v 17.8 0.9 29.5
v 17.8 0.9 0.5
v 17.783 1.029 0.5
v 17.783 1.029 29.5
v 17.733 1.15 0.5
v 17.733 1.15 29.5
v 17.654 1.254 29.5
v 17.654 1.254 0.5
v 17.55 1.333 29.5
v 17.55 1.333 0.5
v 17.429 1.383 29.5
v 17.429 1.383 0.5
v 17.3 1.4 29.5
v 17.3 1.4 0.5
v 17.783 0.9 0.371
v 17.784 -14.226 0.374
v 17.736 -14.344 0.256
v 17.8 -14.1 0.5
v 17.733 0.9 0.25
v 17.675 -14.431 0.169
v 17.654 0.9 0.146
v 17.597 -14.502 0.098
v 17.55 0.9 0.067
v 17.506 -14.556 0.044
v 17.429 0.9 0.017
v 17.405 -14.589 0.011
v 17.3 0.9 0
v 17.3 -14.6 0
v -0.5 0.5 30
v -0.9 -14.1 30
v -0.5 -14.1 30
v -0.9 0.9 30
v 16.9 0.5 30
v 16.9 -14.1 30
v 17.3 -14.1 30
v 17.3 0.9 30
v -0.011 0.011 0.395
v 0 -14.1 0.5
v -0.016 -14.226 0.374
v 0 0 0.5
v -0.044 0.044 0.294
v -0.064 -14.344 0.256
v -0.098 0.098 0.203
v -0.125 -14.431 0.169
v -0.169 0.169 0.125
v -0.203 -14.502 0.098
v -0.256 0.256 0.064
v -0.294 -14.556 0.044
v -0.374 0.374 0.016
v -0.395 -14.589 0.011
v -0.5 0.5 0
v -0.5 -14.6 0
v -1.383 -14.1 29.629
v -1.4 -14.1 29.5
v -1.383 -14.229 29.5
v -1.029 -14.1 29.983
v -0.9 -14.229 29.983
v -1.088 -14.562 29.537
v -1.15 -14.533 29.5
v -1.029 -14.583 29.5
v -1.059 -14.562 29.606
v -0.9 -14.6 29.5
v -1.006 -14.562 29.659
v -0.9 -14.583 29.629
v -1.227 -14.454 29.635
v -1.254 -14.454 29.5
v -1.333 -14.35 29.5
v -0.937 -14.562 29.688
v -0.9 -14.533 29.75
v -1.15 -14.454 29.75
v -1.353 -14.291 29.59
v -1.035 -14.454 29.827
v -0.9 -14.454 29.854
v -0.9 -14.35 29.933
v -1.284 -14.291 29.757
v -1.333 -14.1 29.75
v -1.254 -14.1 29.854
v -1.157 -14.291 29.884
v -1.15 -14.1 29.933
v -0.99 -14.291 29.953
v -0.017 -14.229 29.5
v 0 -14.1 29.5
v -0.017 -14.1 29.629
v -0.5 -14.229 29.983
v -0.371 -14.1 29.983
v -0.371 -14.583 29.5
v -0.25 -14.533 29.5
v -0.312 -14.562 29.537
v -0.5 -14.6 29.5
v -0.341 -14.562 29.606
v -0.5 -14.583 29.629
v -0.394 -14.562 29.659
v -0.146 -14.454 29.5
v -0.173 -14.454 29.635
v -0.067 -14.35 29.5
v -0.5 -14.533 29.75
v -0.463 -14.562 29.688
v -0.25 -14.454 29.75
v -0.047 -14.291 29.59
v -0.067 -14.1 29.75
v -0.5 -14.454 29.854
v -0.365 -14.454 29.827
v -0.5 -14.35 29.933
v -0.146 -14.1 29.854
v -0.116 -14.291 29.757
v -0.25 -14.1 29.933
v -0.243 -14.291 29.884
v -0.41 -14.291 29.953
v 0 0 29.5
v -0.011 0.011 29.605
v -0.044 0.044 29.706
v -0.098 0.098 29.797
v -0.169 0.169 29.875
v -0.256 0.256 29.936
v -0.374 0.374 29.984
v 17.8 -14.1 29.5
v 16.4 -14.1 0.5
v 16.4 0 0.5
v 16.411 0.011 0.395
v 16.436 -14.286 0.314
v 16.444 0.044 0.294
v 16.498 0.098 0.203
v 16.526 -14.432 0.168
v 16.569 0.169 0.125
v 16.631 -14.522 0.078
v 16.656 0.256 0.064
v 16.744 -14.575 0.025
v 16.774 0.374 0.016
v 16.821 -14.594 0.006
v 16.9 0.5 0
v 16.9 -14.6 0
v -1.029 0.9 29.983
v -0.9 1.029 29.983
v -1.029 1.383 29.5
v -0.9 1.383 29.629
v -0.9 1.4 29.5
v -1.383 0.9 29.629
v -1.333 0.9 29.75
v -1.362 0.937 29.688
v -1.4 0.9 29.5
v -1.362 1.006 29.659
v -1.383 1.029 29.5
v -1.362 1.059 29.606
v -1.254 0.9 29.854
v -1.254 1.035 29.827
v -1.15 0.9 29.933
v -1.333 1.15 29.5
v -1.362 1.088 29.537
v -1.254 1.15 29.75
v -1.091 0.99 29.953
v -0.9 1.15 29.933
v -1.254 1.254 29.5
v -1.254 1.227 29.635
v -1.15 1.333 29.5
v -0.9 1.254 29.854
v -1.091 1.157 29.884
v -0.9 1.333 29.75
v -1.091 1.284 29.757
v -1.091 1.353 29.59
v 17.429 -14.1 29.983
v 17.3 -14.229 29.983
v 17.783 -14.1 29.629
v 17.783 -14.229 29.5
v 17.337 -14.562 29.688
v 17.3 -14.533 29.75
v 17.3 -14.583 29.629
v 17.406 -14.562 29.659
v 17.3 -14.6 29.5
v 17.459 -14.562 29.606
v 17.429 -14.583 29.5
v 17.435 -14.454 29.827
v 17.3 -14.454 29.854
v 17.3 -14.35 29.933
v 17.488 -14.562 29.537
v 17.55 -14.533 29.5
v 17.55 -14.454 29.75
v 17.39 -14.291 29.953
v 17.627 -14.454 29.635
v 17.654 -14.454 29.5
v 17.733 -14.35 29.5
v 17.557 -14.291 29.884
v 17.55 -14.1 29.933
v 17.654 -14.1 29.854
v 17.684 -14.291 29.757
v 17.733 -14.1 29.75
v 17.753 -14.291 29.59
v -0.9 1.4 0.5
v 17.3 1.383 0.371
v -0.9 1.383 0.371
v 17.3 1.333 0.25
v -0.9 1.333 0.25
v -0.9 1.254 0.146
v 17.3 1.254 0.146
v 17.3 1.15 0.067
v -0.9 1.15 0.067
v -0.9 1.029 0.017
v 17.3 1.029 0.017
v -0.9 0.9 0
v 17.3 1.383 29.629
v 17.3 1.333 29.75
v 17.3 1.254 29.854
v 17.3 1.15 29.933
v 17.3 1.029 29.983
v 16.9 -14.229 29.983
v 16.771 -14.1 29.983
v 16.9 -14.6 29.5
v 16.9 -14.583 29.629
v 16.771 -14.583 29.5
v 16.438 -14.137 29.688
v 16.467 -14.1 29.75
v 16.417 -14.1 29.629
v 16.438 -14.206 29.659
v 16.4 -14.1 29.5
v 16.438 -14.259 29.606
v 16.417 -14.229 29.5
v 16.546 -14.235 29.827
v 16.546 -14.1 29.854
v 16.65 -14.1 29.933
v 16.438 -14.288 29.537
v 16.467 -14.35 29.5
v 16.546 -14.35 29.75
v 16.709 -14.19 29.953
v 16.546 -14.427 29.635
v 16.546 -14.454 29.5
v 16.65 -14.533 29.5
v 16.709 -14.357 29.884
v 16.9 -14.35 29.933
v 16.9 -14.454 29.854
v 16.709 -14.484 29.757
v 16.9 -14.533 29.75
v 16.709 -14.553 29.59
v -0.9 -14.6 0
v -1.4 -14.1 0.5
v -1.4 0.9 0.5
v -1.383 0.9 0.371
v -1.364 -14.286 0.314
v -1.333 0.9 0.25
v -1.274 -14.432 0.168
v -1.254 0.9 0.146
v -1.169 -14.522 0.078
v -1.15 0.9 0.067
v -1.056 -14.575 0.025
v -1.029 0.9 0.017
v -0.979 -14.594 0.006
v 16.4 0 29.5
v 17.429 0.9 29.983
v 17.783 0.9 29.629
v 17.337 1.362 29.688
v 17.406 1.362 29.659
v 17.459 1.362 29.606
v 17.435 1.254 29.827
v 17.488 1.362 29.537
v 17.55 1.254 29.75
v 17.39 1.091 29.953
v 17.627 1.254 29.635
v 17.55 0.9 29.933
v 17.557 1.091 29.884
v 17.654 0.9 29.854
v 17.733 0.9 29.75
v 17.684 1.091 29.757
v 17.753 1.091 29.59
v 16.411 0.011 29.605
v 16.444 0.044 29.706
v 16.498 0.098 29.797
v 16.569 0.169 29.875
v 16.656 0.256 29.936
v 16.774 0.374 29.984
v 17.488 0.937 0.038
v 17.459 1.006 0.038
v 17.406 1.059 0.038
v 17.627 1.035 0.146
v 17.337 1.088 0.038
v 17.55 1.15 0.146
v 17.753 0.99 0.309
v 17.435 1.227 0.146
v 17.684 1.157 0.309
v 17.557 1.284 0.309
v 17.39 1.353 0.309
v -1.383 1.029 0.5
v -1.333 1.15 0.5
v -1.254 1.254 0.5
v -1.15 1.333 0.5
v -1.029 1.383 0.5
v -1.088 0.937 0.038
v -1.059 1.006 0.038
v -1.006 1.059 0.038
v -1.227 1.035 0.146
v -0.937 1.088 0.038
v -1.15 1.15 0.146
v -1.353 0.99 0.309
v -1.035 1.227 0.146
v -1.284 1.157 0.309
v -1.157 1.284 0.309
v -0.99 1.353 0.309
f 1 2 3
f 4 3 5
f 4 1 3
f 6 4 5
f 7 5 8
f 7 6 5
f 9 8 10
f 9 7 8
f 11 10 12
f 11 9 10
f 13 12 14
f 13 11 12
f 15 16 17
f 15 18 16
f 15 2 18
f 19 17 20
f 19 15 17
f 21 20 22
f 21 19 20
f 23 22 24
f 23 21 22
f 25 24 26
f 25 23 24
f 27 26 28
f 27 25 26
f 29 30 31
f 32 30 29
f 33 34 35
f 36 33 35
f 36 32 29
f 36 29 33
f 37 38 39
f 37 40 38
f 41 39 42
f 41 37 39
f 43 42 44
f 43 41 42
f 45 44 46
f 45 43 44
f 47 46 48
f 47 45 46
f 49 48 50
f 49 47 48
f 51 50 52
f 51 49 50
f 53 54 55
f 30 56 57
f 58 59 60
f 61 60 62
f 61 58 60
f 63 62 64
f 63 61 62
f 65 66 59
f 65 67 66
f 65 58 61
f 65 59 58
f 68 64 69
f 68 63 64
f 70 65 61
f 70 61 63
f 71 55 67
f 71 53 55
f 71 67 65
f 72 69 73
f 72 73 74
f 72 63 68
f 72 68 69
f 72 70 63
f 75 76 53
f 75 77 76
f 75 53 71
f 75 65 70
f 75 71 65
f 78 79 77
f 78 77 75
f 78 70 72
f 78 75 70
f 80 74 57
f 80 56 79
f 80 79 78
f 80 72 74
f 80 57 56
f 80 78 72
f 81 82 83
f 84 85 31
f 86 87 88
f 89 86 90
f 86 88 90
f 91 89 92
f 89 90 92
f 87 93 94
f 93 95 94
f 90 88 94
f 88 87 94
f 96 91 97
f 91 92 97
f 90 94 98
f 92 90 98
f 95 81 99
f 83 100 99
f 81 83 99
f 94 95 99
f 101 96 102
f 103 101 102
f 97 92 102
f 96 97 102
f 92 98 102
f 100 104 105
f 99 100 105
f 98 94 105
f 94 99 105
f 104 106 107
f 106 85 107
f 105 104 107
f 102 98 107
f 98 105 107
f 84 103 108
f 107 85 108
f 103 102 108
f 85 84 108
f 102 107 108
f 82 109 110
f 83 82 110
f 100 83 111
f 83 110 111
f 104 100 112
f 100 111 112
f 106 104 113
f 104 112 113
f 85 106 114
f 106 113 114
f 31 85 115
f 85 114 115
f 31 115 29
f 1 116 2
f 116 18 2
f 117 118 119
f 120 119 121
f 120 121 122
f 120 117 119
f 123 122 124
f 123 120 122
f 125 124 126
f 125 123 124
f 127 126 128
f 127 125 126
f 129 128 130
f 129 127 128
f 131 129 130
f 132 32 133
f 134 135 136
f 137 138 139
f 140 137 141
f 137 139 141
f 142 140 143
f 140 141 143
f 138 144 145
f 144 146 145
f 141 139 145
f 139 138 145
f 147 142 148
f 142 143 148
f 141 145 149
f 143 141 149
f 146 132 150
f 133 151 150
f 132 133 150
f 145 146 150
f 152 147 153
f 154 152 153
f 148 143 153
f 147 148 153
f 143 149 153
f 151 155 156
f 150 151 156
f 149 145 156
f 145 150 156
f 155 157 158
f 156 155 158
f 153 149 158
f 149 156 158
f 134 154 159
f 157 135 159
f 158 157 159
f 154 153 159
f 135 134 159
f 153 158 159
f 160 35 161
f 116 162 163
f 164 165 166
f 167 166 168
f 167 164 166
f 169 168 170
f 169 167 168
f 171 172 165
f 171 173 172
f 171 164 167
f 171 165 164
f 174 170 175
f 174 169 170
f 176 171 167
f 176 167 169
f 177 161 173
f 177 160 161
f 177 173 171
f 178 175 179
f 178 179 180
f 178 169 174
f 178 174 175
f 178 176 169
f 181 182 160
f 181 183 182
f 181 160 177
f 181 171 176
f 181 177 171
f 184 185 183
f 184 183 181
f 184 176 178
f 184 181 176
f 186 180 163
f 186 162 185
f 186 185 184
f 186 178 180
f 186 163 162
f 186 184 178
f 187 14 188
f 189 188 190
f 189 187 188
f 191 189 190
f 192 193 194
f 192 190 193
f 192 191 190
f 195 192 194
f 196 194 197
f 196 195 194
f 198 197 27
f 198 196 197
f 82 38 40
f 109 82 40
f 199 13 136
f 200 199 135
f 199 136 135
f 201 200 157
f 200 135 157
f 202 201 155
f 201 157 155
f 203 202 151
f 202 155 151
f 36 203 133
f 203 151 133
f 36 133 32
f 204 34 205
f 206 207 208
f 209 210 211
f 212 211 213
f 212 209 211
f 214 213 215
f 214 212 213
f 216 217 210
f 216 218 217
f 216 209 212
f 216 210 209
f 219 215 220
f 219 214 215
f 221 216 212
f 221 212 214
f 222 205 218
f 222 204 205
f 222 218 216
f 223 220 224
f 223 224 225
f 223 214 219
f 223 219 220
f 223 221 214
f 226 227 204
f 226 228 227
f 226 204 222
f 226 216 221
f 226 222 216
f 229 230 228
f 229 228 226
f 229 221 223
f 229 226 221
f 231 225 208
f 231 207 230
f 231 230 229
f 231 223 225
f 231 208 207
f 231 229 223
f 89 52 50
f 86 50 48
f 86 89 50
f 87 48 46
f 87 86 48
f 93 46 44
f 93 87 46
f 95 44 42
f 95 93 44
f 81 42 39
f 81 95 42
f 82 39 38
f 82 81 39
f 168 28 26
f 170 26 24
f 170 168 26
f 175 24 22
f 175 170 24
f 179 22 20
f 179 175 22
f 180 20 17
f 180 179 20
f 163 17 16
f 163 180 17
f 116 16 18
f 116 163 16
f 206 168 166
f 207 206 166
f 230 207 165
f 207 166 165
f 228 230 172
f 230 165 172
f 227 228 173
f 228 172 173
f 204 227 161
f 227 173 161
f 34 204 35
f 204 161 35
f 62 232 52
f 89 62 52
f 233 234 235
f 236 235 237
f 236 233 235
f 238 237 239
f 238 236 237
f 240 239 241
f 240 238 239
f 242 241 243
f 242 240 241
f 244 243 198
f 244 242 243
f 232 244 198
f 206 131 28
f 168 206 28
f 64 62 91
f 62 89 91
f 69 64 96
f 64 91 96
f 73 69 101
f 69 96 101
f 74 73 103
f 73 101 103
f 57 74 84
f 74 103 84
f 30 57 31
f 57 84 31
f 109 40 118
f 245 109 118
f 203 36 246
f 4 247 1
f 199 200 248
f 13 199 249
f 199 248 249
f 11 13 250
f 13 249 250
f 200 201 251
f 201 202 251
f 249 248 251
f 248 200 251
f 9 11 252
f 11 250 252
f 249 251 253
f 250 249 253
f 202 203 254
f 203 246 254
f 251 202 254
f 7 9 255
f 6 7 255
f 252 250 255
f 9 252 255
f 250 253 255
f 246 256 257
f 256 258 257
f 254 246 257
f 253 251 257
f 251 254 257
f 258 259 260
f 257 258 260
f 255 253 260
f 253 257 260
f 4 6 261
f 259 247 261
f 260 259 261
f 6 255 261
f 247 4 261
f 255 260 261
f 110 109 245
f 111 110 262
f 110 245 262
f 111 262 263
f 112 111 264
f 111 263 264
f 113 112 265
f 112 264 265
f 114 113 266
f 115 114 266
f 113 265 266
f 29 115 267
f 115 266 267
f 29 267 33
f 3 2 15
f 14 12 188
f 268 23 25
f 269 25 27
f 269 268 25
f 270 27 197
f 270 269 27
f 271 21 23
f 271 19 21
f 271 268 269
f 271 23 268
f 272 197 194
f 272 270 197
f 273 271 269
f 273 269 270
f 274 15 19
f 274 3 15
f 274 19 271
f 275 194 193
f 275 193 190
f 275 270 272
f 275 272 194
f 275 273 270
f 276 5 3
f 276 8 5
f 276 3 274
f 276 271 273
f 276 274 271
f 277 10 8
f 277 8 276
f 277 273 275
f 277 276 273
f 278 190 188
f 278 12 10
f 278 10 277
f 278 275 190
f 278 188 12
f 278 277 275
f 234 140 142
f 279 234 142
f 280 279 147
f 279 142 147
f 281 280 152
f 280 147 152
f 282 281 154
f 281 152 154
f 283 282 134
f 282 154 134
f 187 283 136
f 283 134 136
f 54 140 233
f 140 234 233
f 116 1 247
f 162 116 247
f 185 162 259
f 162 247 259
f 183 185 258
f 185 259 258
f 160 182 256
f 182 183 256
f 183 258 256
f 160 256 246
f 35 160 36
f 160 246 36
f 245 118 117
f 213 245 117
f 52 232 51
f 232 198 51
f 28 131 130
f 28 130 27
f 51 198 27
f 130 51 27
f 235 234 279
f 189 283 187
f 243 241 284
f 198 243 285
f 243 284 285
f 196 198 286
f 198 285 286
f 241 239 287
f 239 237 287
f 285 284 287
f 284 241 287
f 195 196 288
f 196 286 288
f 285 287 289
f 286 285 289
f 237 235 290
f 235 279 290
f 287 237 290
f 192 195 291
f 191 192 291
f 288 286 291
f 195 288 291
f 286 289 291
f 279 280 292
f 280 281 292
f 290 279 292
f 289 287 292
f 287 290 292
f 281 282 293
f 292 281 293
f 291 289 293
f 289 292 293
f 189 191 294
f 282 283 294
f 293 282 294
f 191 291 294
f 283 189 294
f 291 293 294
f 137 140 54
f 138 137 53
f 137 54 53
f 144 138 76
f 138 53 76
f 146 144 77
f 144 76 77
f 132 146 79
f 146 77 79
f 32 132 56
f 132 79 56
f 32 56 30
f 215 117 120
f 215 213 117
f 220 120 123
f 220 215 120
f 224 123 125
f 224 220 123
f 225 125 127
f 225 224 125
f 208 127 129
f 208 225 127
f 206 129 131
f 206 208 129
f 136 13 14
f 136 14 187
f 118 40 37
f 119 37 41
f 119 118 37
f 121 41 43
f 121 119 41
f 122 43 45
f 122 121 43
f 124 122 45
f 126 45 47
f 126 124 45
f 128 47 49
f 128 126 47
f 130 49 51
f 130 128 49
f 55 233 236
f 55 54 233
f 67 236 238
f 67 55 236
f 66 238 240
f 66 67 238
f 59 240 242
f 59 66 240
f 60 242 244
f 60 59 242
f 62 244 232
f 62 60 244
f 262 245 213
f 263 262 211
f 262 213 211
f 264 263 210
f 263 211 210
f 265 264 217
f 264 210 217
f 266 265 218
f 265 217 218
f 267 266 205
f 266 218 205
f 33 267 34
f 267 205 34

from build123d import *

# Parameters (mm, degrees)
PAD_DEPTH = 30
FILLET_R  = 0.5


with BuildPart() as part:
    # Sketch → Pad (new body)
    with BuildSketch(Plane.XY):
        Polygon((-1.4, 1.4), (-1.4, -14.6), (0, -14.6), (0, 0), (16.4, 0), (16.4, -14.6), (17.8, -14.6), (17.8, 1.4), align=None)
    extrude(amount=PAD_DEPTH)

    # Fillet
    fillet_edges = [part.edges().sort_by_distance(p)[0] for p in [
        (17.8, -6.6, 30),
        (17.1, -14.6, 30),
        (16.4, -7.3, 30),
        (8.2, 0, 30),
        (8.2, 1.4, 30),
        (-1.4, -6.6, 30),
        (0, -7.3, 30),
        (-1.4, 1.4, 15),
        (17.8, 1.4, 15),
        (17.8, -14.6, 15),
        (16.4, -14.6, 15),
        (0, -14.6, 15),
        (-1.4, -14.6, 15),
        (-0.7, -14.6, 30),
        (17.8, -6.6, 0),
        (16.4, -7.3, 0),
        (0, -7.3, 0),
        (-1.4, -6.6, 0),
        (8.2, 1.4, 0),
        (8.2, 0, 0),
    ]]
    fillet(fillet_edges, radius=FILLET_R)


solid = part.part
